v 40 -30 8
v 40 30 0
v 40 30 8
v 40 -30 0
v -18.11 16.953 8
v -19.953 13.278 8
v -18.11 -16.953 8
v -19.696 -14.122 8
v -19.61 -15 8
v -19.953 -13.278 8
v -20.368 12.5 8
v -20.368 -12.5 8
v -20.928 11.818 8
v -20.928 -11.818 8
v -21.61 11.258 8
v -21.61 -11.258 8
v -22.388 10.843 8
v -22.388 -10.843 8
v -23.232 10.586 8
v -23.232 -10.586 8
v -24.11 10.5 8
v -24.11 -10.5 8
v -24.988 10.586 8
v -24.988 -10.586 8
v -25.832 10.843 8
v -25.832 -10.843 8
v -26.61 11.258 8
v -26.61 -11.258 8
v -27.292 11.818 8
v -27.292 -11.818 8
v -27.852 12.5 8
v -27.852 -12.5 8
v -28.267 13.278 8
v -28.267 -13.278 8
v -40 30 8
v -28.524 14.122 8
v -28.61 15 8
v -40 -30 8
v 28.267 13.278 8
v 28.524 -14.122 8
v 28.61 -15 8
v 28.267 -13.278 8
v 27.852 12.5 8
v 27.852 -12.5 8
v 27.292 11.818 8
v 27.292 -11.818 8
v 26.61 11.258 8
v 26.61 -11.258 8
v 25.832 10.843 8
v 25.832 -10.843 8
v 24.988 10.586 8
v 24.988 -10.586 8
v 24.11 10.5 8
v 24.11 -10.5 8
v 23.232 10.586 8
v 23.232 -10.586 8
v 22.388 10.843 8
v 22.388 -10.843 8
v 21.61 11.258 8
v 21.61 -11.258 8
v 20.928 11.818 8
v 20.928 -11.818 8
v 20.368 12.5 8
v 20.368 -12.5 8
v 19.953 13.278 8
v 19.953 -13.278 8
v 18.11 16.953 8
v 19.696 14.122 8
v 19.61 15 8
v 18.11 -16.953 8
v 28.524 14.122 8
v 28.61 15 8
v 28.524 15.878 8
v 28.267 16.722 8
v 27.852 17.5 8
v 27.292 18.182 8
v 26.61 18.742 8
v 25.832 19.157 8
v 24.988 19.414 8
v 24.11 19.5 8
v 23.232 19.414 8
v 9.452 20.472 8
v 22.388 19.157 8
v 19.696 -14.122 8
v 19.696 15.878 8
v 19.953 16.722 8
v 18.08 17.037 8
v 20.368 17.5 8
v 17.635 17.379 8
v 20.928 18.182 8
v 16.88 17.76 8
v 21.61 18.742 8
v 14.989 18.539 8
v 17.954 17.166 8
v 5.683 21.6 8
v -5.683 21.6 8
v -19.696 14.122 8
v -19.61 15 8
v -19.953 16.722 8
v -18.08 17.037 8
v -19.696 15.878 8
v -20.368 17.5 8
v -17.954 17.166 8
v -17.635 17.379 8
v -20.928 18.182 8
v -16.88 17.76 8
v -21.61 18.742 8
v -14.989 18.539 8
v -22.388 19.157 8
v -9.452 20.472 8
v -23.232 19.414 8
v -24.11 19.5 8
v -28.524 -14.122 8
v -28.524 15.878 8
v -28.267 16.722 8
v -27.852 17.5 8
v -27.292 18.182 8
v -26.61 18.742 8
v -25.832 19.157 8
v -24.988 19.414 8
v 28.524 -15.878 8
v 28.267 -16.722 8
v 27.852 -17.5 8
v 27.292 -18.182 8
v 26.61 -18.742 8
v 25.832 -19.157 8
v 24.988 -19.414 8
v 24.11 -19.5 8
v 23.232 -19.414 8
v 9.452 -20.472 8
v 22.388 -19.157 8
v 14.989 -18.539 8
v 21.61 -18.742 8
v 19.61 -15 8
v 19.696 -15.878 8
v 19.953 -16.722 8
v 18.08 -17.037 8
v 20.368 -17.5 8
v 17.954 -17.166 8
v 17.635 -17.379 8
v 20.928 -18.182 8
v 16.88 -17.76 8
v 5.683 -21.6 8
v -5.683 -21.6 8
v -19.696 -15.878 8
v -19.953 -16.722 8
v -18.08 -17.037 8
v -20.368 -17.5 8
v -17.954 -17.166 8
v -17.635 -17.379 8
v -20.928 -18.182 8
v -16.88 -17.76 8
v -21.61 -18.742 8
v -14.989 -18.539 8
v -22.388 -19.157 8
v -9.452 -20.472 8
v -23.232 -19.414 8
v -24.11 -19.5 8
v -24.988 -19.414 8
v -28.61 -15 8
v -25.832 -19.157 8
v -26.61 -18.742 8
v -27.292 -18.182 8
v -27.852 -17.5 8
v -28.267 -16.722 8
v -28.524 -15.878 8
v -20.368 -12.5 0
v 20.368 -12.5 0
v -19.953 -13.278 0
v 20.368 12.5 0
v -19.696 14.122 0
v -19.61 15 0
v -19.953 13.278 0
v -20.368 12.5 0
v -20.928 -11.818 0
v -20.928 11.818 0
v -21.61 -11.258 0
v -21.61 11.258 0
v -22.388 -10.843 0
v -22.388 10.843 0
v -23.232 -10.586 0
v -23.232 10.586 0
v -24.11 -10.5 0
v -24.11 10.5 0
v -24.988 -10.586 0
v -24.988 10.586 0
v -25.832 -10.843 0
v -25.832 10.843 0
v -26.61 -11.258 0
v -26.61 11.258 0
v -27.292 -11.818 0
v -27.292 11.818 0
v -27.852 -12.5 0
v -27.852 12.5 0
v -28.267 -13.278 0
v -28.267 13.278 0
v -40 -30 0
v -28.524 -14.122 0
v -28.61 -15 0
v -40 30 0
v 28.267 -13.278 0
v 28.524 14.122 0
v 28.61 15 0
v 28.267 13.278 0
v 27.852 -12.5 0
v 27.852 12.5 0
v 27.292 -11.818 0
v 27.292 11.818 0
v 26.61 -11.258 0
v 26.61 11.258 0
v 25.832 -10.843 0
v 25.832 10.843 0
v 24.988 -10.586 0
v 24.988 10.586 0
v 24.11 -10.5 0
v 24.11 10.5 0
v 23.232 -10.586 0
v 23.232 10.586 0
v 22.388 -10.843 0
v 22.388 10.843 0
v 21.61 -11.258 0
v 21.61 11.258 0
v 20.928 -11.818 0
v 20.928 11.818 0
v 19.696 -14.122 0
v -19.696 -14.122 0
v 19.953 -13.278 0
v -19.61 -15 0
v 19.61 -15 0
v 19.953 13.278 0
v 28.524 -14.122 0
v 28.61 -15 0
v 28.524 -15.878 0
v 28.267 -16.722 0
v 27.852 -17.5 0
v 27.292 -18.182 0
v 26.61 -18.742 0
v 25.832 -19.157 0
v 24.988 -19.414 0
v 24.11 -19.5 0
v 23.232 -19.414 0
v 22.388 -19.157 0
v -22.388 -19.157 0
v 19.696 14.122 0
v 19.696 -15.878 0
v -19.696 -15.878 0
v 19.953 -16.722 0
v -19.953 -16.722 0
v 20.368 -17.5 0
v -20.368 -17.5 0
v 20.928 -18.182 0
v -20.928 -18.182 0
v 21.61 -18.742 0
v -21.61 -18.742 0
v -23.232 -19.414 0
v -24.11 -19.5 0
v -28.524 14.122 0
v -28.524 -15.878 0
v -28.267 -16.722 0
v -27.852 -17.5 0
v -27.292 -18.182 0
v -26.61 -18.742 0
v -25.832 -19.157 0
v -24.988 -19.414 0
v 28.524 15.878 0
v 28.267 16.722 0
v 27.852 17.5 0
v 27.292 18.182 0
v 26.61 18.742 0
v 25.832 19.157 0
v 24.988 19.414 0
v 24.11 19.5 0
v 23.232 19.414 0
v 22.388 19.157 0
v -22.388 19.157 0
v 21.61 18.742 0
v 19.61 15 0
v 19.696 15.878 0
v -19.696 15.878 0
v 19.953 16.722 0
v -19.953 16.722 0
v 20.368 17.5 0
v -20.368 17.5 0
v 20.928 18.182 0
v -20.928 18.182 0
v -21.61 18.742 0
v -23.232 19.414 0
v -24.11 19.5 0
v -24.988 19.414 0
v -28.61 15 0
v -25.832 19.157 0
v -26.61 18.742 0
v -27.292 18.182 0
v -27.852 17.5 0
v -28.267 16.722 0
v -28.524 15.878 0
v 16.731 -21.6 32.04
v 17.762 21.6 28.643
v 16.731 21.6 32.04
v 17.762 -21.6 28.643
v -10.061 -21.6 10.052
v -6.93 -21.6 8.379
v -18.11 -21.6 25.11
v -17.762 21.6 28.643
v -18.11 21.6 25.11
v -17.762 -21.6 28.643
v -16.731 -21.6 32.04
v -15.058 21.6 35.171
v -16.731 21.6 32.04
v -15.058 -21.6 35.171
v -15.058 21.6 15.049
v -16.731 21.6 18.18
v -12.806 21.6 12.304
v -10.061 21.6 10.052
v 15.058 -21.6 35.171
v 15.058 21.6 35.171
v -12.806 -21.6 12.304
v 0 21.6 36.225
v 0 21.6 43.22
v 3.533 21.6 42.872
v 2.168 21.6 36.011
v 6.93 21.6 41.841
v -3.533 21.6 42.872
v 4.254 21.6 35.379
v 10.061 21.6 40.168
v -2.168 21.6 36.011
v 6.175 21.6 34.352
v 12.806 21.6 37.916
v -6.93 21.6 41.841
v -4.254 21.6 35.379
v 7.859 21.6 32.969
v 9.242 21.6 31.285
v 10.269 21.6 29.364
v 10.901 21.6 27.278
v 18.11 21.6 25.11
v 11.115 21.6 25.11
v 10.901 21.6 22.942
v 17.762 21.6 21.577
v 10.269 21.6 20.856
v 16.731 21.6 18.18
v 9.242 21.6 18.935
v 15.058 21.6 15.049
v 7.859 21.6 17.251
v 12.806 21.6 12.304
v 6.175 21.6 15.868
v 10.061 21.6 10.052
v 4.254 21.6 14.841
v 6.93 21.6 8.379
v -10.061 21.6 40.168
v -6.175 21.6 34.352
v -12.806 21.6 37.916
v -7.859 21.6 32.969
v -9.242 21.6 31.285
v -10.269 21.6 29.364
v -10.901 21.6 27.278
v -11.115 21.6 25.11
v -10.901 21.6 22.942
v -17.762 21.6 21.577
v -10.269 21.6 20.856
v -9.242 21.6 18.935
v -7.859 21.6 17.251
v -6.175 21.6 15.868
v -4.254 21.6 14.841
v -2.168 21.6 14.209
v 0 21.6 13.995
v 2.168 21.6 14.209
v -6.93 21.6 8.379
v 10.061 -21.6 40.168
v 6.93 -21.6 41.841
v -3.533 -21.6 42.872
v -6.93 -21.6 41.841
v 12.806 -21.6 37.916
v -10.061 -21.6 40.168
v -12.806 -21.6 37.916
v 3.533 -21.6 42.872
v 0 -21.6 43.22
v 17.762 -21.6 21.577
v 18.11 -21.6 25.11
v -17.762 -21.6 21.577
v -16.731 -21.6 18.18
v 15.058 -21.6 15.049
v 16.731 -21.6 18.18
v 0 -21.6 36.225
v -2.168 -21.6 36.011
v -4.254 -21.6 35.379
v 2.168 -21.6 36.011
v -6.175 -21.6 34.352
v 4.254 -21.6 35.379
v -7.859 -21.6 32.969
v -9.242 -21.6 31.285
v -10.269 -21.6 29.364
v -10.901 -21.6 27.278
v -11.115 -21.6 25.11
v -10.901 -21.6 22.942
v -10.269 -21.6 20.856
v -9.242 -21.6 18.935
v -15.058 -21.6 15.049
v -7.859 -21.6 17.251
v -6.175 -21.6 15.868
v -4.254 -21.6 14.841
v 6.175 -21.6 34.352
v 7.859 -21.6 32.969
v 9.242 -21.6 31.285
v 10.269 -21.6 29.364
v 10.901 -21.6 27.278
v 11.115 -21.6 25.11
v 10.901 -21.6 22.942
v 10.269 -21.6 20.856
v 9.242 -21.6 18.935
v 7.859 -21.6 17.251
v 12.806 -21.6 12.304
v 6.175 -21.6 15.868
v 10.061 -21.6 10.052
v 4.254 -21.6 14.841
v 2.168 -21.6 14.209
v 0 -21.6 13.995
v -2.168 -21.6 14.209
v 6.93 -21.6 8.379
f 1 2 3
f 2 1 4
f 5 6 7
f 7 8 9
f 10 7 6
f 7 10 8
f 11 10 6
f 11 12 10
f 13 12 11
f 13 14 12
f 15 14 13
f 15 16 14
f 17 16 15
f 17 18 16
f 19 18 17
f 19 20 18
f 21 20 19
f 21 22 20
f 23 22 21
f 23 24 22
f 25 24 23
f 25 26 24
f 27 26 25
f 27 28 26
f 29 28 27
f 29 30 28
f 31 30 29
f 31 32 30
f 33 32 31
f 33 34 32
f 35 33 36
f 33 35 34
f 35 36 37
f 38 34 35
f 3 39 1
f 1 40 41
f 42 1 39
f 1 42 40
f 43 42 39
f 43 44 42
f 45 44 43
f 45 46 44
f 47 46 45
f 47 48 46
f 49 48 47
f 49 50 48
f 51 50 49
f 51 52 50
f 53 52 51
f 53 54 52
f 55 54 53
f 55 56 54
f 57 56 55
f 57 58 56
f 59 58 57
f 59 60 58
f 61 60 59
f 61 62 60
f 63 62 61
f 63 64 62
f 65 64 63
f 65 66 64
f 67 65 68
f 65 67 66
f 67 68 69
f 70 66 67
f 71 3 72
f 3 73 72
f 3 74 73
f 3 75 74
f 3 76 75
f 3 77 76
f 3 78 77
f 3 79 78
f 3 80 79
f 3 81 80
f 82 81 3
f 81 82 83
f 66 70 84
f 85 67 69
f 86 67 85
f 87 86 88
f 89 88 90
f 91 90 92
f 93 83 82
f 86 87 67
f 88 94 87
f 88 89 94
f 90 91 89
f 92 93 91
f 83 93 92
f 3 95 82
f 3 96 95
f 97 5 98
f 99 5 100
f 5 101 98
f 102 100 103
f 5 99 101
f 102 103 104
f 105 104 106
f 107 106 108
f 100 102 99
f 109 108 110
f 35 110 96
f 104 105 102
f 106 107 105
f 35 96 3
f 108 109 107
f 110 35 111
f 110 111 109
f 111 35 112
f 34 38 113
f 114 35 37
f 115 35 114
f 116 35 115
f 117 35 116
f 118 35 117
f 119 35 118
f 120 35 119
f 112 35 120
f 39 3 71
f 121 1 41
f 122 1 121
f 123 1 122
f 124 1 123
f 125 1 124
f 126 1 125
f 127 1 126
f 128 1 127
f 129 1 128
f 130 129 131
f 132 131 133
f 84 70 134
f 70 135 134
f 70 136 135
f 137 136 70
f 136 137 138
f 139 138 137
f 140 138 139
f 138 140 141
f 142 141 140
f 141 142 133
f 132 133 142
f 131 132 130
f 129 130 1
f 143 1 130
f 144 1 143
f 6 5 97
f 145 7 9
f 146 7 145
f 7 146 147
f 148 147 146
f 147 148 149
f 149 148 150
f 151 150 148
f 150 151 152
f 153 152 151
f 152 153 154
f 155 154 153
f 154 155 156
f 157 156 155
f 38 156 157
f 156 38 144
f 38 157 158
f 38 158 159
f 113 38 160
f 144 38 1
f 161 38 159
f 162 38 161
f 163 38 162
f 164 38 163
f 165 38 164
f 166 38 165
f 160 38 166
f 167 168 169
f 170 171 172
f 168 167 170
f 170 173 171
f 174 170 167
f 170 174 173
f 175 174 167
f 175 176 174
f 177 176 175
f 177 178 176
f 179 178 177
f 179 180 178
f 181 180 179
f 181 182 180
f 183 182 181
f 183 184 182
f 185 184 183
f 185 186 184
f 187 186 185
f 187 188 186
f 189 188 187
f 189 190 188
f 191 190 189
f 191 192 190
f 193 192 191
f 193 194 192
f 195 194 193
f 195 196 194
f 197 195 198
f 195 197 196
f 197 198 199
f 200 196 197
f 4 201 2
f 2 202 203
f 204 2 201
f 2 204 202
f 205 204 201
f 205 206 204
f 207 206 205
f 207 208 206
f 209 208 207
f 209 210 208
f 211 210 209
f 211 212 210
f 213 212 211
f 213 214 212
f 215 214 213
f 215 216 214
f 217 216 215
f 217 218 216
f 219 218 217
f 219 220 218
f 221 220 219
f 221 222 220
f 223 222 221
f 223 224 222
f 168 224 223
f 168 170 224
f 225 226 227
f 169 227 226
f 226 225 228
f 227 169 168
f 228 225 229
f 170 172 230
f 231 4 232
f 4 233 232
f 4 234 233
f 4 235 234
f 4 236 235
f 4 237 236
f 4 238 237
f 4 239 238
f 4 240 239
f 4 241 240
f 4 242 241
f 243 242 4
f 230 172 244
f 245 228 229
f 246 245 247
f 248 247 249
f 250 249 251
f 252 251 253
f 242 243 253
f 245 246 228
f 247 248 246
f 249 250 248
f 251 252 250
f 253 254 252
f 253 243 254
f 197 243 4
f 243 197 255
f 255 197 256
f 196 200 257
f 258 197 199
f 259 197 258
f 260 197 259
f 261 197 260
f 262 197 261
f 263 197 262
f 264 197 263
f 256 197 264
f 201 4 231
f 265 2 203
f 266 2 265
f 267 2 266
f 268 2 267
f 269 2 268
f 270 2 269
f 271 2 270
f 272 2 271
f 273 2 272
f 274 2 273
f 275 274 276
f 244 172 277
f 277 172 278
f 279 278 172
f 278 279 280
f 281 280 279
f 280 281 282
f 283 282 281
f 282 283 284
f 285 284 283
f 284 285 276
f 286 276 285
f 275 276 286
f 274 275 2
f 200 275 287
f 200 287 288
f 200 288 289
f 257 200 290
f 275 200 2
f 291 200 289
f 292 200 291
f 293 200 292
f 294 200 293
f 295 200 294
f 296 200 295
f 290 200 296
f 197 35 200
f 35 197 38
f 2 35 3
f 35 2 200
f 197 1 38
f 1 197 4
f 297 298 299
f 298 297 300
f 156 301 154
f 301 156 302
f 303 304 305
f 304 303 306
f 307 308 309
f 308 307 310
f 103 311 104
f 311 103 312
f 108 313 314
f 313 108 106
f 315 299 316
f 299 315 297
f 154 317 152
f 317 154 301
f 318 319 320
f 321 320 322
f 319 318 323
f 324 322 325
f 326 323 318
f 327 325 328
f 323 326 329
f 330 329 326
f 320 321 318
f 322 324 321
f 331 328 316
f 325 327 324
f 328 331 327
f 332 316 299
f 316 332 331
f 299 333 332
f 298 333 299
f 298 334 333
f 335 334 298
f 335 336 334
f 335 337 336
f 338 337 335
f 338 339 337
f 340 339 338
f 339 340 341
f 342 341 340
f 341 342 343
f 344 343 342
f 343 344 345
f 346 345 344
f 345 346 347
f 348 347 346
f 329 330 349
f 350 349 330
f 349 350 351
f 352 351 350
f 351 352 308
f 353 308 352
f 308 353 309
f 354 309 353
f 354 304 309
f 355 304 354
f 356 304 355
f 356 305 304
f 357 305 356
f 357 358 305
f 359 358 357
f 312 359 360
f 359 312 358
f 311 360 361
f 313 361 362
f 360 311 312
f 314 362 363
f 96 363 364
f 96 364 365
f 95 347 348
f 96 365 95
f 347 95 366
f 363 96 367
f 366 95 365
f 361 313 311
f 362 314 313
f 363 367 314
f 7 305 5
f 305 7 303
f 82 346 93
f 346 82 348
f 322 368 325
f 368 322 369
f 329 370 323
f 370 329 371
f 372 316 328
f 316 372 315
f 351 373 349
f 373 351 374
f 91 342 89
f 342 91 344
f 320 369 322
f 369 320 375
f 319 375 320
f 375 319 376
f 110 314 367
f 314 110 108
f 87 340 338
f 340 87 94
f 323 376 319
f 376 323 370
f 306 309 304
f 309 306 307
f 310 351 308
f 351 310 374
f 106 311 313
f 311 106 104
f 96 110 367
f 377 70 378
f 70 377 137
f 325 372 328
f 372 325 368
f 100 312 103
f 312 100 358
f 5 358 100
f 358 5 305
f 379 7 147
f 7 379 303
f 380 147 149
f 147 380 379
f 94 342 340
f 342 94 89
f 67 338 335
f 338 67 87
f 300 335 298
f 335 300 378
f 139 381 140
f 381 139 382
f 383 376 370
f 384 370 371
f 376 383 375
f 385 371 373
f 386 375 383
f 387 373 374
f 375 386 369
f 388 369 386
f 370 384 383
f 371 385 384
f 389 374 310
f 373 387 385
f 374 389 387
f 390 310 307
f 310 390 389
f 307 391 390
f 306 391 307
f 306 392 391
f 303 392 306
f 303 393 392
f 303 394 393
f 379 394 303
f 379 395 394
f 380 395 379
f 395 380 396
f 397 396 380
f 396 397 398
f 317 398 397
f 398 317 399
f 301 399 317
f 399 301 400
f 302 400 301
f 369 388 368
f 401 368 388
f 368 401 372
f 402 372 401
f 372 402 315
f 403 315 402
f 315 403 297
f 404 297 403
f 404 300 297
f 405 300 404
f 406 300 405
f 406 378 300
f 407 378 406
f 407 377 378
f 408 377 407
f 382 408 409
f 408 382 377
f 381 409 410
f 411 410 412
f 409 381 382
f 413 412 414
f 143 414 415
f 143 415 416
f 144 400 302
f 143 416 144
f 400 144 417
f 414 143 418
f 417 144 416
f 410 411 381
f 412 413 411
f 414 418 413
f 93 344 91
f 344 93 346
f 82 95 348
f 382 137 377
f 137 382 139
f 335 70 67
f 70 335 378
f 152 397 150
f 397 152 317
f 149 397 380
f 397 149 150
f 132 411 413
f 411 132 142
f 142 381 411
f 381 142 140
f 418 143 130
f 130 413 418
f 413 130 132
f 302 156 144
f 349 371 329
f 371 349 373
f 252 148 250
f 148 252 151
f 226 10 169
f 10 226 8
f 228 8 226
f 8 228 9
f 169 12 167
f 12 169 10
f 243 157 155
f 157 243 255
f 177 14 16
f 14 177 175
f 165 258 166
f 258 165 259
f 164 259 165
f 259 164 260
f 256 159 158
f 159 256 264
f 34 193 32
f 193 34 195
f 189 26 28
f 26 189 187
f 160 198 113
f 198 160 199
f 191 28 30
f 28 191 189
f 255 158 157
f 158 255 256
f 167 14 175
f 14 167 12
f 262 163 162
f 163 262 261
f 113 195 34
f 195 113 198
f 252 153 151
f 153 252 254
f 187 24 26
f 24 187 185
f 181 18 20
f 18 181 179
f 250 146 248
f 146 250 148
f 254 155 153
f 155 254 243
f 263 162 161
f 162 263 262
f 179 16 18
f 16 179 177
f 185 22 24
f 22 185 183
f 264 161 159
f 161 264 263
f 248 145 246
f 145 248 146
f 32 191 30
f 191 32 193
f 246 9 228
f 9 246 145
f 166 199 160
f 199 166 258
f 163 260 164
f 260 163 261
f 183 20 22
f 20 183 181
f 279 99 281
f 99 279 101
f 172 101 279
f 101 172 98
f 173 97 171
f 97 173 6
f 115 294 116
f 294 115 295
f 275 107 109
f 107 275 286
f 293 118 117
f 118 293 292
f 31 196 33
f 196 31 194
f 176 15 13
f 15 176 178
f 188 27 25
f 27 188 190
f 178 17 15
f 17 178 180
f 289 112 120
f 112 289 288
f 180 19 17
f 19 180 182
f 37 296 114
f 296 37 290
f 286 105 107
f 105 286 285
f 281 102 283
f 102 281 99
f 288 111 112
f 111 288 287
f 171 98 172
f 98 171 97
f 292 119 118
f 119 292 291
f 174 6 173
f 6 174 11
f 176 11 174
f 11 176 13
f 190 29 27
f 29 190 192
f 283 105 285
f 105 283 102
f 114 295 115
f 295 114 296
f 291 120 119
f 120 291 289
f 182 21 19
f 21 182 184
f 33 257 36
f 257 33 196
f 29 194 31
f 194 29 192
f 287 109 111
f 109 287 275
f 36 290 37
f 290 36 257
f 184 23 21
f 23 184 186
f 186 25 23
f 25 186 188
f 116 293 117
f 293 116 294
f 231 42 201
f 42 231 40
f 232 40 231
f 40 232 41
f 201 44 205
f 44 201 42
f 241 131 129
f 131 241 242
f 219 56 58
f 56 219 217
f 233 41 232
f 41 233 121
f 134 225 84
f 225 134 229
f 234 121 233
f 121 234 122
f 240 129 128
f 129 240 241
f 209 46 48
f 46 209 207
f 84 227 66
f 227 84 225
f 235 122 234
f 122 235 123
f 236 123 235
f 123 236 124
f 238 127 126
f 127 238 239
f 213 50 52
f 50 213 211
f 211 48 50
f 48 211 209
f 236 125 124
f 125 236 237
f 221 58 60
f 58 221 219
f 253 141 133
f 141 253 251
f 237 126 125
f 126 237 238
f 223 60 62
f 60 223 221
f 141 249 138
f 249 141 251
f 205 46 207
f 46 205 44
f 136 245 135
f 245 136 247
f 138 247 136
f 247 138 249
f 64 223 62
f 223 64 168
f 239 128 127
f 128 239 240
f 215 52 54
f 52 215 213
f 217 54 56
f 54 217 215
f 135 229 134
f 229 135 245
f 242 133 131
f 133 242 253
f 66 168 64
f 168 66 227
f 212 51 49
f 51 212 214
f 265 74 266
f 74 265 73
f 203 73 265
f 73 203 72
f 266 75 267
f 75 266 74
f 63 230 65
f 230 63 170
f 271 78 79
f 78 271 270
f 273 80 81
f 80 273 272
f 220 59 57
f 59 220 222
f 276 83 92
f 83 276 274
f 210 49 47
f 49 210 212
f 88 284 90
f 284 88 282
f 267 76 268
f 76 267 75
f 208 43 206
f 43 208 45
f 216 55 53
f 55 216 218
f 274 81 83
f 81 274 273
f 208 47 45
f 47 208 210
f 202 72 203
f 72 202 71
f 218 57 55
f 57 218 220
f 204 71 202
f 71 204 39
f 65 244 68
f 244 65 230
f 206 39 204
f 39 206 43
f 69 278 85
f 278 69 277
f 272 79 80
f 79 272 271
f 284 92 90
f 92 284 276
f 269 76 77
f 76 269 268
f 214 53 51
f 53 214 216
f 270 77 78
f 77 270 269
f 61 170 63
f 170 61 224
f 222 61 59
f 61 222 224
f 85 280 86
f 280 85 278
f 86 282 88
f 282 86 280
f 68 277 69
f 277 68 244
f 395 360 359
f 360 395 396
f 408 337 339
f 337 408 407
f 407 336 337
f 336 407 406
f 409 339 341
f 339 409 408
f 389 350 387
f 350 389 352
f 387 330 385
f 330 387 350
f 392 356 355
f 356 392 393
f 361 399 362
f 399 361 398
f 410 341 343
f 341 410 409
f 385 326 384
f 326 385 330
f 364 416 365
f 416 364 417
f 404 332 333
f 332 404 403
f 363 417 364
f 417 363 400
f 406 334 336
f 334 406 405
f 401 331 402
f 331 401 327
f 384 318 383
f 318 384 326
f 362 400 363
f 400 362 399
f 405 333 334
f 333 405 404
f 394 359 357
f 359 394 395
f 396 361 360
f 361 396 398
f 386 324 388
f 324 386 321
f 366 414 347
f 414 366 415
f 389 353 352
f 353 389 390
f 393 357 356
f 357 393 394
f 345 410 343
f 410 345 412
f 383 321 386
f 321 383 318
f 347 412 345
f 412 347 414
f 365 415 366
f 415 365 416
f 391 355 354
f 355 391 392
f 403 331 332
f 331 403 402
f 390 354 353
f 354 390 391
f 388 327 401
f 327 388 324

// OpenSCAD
$fn = 32;

// ----------------------------------------------------------------------
// Bearing block: 80 x 60 mm base, 22.23 mm bore at 25.11 mm
// ----------------------------------------------------------------------

// --- parameters (mm) ---
base_w = 80;              // base width
base_d = 60;              // base depth
base_t = 8;               // base thickness
bore_d = 22.23;           // shaft / bearing bore
house_r = 18.11;          // housing outer radius
house_len = 43.2;         // housing length along the shaft
foot_w = 36.22;           // foot width under the housing
foot_len = 33.2;          // foot length along the shaft
axis_z = 25.11;           // bore axis height above the base
holes_d = 9;              // mounting holes
hole_x = 24.11;           // mounting hole spacing

difference() {
  union() {
    /* base plate with its underside on z = 0 */
    translate([0, 0, base_t / 2]) cube([base_w, base_d, base_t], center = true);
    /* hull foot: a straight web blending into the round housing */
    hull() {
      translate([0, 0, base_t - 0.5]) cube([foot_w, foot_len, 1.6], center = true);
      translate([0, 0, axis_z]) rotate([-90, 0, 0]) cylinder(h = house_len, d = 2 * house_r, center = true);
    }
  }
  /* bore through the housing, 2.5 mm clear on both sides */
  translate([0, 0, axis_z]) rotate([-90, 0, 0]) cylinder(h = house_len + 5, d = bore_d, center = true);
  /* mounting holes through the base plate */
  for (hx = [-24.11, 24.11]) {
    for (hy = [-15, 15]) {
      translate([hx, hy, -2.5]) cylinder(h = base_t + 5, d = holes_d);
    }
  }
}
